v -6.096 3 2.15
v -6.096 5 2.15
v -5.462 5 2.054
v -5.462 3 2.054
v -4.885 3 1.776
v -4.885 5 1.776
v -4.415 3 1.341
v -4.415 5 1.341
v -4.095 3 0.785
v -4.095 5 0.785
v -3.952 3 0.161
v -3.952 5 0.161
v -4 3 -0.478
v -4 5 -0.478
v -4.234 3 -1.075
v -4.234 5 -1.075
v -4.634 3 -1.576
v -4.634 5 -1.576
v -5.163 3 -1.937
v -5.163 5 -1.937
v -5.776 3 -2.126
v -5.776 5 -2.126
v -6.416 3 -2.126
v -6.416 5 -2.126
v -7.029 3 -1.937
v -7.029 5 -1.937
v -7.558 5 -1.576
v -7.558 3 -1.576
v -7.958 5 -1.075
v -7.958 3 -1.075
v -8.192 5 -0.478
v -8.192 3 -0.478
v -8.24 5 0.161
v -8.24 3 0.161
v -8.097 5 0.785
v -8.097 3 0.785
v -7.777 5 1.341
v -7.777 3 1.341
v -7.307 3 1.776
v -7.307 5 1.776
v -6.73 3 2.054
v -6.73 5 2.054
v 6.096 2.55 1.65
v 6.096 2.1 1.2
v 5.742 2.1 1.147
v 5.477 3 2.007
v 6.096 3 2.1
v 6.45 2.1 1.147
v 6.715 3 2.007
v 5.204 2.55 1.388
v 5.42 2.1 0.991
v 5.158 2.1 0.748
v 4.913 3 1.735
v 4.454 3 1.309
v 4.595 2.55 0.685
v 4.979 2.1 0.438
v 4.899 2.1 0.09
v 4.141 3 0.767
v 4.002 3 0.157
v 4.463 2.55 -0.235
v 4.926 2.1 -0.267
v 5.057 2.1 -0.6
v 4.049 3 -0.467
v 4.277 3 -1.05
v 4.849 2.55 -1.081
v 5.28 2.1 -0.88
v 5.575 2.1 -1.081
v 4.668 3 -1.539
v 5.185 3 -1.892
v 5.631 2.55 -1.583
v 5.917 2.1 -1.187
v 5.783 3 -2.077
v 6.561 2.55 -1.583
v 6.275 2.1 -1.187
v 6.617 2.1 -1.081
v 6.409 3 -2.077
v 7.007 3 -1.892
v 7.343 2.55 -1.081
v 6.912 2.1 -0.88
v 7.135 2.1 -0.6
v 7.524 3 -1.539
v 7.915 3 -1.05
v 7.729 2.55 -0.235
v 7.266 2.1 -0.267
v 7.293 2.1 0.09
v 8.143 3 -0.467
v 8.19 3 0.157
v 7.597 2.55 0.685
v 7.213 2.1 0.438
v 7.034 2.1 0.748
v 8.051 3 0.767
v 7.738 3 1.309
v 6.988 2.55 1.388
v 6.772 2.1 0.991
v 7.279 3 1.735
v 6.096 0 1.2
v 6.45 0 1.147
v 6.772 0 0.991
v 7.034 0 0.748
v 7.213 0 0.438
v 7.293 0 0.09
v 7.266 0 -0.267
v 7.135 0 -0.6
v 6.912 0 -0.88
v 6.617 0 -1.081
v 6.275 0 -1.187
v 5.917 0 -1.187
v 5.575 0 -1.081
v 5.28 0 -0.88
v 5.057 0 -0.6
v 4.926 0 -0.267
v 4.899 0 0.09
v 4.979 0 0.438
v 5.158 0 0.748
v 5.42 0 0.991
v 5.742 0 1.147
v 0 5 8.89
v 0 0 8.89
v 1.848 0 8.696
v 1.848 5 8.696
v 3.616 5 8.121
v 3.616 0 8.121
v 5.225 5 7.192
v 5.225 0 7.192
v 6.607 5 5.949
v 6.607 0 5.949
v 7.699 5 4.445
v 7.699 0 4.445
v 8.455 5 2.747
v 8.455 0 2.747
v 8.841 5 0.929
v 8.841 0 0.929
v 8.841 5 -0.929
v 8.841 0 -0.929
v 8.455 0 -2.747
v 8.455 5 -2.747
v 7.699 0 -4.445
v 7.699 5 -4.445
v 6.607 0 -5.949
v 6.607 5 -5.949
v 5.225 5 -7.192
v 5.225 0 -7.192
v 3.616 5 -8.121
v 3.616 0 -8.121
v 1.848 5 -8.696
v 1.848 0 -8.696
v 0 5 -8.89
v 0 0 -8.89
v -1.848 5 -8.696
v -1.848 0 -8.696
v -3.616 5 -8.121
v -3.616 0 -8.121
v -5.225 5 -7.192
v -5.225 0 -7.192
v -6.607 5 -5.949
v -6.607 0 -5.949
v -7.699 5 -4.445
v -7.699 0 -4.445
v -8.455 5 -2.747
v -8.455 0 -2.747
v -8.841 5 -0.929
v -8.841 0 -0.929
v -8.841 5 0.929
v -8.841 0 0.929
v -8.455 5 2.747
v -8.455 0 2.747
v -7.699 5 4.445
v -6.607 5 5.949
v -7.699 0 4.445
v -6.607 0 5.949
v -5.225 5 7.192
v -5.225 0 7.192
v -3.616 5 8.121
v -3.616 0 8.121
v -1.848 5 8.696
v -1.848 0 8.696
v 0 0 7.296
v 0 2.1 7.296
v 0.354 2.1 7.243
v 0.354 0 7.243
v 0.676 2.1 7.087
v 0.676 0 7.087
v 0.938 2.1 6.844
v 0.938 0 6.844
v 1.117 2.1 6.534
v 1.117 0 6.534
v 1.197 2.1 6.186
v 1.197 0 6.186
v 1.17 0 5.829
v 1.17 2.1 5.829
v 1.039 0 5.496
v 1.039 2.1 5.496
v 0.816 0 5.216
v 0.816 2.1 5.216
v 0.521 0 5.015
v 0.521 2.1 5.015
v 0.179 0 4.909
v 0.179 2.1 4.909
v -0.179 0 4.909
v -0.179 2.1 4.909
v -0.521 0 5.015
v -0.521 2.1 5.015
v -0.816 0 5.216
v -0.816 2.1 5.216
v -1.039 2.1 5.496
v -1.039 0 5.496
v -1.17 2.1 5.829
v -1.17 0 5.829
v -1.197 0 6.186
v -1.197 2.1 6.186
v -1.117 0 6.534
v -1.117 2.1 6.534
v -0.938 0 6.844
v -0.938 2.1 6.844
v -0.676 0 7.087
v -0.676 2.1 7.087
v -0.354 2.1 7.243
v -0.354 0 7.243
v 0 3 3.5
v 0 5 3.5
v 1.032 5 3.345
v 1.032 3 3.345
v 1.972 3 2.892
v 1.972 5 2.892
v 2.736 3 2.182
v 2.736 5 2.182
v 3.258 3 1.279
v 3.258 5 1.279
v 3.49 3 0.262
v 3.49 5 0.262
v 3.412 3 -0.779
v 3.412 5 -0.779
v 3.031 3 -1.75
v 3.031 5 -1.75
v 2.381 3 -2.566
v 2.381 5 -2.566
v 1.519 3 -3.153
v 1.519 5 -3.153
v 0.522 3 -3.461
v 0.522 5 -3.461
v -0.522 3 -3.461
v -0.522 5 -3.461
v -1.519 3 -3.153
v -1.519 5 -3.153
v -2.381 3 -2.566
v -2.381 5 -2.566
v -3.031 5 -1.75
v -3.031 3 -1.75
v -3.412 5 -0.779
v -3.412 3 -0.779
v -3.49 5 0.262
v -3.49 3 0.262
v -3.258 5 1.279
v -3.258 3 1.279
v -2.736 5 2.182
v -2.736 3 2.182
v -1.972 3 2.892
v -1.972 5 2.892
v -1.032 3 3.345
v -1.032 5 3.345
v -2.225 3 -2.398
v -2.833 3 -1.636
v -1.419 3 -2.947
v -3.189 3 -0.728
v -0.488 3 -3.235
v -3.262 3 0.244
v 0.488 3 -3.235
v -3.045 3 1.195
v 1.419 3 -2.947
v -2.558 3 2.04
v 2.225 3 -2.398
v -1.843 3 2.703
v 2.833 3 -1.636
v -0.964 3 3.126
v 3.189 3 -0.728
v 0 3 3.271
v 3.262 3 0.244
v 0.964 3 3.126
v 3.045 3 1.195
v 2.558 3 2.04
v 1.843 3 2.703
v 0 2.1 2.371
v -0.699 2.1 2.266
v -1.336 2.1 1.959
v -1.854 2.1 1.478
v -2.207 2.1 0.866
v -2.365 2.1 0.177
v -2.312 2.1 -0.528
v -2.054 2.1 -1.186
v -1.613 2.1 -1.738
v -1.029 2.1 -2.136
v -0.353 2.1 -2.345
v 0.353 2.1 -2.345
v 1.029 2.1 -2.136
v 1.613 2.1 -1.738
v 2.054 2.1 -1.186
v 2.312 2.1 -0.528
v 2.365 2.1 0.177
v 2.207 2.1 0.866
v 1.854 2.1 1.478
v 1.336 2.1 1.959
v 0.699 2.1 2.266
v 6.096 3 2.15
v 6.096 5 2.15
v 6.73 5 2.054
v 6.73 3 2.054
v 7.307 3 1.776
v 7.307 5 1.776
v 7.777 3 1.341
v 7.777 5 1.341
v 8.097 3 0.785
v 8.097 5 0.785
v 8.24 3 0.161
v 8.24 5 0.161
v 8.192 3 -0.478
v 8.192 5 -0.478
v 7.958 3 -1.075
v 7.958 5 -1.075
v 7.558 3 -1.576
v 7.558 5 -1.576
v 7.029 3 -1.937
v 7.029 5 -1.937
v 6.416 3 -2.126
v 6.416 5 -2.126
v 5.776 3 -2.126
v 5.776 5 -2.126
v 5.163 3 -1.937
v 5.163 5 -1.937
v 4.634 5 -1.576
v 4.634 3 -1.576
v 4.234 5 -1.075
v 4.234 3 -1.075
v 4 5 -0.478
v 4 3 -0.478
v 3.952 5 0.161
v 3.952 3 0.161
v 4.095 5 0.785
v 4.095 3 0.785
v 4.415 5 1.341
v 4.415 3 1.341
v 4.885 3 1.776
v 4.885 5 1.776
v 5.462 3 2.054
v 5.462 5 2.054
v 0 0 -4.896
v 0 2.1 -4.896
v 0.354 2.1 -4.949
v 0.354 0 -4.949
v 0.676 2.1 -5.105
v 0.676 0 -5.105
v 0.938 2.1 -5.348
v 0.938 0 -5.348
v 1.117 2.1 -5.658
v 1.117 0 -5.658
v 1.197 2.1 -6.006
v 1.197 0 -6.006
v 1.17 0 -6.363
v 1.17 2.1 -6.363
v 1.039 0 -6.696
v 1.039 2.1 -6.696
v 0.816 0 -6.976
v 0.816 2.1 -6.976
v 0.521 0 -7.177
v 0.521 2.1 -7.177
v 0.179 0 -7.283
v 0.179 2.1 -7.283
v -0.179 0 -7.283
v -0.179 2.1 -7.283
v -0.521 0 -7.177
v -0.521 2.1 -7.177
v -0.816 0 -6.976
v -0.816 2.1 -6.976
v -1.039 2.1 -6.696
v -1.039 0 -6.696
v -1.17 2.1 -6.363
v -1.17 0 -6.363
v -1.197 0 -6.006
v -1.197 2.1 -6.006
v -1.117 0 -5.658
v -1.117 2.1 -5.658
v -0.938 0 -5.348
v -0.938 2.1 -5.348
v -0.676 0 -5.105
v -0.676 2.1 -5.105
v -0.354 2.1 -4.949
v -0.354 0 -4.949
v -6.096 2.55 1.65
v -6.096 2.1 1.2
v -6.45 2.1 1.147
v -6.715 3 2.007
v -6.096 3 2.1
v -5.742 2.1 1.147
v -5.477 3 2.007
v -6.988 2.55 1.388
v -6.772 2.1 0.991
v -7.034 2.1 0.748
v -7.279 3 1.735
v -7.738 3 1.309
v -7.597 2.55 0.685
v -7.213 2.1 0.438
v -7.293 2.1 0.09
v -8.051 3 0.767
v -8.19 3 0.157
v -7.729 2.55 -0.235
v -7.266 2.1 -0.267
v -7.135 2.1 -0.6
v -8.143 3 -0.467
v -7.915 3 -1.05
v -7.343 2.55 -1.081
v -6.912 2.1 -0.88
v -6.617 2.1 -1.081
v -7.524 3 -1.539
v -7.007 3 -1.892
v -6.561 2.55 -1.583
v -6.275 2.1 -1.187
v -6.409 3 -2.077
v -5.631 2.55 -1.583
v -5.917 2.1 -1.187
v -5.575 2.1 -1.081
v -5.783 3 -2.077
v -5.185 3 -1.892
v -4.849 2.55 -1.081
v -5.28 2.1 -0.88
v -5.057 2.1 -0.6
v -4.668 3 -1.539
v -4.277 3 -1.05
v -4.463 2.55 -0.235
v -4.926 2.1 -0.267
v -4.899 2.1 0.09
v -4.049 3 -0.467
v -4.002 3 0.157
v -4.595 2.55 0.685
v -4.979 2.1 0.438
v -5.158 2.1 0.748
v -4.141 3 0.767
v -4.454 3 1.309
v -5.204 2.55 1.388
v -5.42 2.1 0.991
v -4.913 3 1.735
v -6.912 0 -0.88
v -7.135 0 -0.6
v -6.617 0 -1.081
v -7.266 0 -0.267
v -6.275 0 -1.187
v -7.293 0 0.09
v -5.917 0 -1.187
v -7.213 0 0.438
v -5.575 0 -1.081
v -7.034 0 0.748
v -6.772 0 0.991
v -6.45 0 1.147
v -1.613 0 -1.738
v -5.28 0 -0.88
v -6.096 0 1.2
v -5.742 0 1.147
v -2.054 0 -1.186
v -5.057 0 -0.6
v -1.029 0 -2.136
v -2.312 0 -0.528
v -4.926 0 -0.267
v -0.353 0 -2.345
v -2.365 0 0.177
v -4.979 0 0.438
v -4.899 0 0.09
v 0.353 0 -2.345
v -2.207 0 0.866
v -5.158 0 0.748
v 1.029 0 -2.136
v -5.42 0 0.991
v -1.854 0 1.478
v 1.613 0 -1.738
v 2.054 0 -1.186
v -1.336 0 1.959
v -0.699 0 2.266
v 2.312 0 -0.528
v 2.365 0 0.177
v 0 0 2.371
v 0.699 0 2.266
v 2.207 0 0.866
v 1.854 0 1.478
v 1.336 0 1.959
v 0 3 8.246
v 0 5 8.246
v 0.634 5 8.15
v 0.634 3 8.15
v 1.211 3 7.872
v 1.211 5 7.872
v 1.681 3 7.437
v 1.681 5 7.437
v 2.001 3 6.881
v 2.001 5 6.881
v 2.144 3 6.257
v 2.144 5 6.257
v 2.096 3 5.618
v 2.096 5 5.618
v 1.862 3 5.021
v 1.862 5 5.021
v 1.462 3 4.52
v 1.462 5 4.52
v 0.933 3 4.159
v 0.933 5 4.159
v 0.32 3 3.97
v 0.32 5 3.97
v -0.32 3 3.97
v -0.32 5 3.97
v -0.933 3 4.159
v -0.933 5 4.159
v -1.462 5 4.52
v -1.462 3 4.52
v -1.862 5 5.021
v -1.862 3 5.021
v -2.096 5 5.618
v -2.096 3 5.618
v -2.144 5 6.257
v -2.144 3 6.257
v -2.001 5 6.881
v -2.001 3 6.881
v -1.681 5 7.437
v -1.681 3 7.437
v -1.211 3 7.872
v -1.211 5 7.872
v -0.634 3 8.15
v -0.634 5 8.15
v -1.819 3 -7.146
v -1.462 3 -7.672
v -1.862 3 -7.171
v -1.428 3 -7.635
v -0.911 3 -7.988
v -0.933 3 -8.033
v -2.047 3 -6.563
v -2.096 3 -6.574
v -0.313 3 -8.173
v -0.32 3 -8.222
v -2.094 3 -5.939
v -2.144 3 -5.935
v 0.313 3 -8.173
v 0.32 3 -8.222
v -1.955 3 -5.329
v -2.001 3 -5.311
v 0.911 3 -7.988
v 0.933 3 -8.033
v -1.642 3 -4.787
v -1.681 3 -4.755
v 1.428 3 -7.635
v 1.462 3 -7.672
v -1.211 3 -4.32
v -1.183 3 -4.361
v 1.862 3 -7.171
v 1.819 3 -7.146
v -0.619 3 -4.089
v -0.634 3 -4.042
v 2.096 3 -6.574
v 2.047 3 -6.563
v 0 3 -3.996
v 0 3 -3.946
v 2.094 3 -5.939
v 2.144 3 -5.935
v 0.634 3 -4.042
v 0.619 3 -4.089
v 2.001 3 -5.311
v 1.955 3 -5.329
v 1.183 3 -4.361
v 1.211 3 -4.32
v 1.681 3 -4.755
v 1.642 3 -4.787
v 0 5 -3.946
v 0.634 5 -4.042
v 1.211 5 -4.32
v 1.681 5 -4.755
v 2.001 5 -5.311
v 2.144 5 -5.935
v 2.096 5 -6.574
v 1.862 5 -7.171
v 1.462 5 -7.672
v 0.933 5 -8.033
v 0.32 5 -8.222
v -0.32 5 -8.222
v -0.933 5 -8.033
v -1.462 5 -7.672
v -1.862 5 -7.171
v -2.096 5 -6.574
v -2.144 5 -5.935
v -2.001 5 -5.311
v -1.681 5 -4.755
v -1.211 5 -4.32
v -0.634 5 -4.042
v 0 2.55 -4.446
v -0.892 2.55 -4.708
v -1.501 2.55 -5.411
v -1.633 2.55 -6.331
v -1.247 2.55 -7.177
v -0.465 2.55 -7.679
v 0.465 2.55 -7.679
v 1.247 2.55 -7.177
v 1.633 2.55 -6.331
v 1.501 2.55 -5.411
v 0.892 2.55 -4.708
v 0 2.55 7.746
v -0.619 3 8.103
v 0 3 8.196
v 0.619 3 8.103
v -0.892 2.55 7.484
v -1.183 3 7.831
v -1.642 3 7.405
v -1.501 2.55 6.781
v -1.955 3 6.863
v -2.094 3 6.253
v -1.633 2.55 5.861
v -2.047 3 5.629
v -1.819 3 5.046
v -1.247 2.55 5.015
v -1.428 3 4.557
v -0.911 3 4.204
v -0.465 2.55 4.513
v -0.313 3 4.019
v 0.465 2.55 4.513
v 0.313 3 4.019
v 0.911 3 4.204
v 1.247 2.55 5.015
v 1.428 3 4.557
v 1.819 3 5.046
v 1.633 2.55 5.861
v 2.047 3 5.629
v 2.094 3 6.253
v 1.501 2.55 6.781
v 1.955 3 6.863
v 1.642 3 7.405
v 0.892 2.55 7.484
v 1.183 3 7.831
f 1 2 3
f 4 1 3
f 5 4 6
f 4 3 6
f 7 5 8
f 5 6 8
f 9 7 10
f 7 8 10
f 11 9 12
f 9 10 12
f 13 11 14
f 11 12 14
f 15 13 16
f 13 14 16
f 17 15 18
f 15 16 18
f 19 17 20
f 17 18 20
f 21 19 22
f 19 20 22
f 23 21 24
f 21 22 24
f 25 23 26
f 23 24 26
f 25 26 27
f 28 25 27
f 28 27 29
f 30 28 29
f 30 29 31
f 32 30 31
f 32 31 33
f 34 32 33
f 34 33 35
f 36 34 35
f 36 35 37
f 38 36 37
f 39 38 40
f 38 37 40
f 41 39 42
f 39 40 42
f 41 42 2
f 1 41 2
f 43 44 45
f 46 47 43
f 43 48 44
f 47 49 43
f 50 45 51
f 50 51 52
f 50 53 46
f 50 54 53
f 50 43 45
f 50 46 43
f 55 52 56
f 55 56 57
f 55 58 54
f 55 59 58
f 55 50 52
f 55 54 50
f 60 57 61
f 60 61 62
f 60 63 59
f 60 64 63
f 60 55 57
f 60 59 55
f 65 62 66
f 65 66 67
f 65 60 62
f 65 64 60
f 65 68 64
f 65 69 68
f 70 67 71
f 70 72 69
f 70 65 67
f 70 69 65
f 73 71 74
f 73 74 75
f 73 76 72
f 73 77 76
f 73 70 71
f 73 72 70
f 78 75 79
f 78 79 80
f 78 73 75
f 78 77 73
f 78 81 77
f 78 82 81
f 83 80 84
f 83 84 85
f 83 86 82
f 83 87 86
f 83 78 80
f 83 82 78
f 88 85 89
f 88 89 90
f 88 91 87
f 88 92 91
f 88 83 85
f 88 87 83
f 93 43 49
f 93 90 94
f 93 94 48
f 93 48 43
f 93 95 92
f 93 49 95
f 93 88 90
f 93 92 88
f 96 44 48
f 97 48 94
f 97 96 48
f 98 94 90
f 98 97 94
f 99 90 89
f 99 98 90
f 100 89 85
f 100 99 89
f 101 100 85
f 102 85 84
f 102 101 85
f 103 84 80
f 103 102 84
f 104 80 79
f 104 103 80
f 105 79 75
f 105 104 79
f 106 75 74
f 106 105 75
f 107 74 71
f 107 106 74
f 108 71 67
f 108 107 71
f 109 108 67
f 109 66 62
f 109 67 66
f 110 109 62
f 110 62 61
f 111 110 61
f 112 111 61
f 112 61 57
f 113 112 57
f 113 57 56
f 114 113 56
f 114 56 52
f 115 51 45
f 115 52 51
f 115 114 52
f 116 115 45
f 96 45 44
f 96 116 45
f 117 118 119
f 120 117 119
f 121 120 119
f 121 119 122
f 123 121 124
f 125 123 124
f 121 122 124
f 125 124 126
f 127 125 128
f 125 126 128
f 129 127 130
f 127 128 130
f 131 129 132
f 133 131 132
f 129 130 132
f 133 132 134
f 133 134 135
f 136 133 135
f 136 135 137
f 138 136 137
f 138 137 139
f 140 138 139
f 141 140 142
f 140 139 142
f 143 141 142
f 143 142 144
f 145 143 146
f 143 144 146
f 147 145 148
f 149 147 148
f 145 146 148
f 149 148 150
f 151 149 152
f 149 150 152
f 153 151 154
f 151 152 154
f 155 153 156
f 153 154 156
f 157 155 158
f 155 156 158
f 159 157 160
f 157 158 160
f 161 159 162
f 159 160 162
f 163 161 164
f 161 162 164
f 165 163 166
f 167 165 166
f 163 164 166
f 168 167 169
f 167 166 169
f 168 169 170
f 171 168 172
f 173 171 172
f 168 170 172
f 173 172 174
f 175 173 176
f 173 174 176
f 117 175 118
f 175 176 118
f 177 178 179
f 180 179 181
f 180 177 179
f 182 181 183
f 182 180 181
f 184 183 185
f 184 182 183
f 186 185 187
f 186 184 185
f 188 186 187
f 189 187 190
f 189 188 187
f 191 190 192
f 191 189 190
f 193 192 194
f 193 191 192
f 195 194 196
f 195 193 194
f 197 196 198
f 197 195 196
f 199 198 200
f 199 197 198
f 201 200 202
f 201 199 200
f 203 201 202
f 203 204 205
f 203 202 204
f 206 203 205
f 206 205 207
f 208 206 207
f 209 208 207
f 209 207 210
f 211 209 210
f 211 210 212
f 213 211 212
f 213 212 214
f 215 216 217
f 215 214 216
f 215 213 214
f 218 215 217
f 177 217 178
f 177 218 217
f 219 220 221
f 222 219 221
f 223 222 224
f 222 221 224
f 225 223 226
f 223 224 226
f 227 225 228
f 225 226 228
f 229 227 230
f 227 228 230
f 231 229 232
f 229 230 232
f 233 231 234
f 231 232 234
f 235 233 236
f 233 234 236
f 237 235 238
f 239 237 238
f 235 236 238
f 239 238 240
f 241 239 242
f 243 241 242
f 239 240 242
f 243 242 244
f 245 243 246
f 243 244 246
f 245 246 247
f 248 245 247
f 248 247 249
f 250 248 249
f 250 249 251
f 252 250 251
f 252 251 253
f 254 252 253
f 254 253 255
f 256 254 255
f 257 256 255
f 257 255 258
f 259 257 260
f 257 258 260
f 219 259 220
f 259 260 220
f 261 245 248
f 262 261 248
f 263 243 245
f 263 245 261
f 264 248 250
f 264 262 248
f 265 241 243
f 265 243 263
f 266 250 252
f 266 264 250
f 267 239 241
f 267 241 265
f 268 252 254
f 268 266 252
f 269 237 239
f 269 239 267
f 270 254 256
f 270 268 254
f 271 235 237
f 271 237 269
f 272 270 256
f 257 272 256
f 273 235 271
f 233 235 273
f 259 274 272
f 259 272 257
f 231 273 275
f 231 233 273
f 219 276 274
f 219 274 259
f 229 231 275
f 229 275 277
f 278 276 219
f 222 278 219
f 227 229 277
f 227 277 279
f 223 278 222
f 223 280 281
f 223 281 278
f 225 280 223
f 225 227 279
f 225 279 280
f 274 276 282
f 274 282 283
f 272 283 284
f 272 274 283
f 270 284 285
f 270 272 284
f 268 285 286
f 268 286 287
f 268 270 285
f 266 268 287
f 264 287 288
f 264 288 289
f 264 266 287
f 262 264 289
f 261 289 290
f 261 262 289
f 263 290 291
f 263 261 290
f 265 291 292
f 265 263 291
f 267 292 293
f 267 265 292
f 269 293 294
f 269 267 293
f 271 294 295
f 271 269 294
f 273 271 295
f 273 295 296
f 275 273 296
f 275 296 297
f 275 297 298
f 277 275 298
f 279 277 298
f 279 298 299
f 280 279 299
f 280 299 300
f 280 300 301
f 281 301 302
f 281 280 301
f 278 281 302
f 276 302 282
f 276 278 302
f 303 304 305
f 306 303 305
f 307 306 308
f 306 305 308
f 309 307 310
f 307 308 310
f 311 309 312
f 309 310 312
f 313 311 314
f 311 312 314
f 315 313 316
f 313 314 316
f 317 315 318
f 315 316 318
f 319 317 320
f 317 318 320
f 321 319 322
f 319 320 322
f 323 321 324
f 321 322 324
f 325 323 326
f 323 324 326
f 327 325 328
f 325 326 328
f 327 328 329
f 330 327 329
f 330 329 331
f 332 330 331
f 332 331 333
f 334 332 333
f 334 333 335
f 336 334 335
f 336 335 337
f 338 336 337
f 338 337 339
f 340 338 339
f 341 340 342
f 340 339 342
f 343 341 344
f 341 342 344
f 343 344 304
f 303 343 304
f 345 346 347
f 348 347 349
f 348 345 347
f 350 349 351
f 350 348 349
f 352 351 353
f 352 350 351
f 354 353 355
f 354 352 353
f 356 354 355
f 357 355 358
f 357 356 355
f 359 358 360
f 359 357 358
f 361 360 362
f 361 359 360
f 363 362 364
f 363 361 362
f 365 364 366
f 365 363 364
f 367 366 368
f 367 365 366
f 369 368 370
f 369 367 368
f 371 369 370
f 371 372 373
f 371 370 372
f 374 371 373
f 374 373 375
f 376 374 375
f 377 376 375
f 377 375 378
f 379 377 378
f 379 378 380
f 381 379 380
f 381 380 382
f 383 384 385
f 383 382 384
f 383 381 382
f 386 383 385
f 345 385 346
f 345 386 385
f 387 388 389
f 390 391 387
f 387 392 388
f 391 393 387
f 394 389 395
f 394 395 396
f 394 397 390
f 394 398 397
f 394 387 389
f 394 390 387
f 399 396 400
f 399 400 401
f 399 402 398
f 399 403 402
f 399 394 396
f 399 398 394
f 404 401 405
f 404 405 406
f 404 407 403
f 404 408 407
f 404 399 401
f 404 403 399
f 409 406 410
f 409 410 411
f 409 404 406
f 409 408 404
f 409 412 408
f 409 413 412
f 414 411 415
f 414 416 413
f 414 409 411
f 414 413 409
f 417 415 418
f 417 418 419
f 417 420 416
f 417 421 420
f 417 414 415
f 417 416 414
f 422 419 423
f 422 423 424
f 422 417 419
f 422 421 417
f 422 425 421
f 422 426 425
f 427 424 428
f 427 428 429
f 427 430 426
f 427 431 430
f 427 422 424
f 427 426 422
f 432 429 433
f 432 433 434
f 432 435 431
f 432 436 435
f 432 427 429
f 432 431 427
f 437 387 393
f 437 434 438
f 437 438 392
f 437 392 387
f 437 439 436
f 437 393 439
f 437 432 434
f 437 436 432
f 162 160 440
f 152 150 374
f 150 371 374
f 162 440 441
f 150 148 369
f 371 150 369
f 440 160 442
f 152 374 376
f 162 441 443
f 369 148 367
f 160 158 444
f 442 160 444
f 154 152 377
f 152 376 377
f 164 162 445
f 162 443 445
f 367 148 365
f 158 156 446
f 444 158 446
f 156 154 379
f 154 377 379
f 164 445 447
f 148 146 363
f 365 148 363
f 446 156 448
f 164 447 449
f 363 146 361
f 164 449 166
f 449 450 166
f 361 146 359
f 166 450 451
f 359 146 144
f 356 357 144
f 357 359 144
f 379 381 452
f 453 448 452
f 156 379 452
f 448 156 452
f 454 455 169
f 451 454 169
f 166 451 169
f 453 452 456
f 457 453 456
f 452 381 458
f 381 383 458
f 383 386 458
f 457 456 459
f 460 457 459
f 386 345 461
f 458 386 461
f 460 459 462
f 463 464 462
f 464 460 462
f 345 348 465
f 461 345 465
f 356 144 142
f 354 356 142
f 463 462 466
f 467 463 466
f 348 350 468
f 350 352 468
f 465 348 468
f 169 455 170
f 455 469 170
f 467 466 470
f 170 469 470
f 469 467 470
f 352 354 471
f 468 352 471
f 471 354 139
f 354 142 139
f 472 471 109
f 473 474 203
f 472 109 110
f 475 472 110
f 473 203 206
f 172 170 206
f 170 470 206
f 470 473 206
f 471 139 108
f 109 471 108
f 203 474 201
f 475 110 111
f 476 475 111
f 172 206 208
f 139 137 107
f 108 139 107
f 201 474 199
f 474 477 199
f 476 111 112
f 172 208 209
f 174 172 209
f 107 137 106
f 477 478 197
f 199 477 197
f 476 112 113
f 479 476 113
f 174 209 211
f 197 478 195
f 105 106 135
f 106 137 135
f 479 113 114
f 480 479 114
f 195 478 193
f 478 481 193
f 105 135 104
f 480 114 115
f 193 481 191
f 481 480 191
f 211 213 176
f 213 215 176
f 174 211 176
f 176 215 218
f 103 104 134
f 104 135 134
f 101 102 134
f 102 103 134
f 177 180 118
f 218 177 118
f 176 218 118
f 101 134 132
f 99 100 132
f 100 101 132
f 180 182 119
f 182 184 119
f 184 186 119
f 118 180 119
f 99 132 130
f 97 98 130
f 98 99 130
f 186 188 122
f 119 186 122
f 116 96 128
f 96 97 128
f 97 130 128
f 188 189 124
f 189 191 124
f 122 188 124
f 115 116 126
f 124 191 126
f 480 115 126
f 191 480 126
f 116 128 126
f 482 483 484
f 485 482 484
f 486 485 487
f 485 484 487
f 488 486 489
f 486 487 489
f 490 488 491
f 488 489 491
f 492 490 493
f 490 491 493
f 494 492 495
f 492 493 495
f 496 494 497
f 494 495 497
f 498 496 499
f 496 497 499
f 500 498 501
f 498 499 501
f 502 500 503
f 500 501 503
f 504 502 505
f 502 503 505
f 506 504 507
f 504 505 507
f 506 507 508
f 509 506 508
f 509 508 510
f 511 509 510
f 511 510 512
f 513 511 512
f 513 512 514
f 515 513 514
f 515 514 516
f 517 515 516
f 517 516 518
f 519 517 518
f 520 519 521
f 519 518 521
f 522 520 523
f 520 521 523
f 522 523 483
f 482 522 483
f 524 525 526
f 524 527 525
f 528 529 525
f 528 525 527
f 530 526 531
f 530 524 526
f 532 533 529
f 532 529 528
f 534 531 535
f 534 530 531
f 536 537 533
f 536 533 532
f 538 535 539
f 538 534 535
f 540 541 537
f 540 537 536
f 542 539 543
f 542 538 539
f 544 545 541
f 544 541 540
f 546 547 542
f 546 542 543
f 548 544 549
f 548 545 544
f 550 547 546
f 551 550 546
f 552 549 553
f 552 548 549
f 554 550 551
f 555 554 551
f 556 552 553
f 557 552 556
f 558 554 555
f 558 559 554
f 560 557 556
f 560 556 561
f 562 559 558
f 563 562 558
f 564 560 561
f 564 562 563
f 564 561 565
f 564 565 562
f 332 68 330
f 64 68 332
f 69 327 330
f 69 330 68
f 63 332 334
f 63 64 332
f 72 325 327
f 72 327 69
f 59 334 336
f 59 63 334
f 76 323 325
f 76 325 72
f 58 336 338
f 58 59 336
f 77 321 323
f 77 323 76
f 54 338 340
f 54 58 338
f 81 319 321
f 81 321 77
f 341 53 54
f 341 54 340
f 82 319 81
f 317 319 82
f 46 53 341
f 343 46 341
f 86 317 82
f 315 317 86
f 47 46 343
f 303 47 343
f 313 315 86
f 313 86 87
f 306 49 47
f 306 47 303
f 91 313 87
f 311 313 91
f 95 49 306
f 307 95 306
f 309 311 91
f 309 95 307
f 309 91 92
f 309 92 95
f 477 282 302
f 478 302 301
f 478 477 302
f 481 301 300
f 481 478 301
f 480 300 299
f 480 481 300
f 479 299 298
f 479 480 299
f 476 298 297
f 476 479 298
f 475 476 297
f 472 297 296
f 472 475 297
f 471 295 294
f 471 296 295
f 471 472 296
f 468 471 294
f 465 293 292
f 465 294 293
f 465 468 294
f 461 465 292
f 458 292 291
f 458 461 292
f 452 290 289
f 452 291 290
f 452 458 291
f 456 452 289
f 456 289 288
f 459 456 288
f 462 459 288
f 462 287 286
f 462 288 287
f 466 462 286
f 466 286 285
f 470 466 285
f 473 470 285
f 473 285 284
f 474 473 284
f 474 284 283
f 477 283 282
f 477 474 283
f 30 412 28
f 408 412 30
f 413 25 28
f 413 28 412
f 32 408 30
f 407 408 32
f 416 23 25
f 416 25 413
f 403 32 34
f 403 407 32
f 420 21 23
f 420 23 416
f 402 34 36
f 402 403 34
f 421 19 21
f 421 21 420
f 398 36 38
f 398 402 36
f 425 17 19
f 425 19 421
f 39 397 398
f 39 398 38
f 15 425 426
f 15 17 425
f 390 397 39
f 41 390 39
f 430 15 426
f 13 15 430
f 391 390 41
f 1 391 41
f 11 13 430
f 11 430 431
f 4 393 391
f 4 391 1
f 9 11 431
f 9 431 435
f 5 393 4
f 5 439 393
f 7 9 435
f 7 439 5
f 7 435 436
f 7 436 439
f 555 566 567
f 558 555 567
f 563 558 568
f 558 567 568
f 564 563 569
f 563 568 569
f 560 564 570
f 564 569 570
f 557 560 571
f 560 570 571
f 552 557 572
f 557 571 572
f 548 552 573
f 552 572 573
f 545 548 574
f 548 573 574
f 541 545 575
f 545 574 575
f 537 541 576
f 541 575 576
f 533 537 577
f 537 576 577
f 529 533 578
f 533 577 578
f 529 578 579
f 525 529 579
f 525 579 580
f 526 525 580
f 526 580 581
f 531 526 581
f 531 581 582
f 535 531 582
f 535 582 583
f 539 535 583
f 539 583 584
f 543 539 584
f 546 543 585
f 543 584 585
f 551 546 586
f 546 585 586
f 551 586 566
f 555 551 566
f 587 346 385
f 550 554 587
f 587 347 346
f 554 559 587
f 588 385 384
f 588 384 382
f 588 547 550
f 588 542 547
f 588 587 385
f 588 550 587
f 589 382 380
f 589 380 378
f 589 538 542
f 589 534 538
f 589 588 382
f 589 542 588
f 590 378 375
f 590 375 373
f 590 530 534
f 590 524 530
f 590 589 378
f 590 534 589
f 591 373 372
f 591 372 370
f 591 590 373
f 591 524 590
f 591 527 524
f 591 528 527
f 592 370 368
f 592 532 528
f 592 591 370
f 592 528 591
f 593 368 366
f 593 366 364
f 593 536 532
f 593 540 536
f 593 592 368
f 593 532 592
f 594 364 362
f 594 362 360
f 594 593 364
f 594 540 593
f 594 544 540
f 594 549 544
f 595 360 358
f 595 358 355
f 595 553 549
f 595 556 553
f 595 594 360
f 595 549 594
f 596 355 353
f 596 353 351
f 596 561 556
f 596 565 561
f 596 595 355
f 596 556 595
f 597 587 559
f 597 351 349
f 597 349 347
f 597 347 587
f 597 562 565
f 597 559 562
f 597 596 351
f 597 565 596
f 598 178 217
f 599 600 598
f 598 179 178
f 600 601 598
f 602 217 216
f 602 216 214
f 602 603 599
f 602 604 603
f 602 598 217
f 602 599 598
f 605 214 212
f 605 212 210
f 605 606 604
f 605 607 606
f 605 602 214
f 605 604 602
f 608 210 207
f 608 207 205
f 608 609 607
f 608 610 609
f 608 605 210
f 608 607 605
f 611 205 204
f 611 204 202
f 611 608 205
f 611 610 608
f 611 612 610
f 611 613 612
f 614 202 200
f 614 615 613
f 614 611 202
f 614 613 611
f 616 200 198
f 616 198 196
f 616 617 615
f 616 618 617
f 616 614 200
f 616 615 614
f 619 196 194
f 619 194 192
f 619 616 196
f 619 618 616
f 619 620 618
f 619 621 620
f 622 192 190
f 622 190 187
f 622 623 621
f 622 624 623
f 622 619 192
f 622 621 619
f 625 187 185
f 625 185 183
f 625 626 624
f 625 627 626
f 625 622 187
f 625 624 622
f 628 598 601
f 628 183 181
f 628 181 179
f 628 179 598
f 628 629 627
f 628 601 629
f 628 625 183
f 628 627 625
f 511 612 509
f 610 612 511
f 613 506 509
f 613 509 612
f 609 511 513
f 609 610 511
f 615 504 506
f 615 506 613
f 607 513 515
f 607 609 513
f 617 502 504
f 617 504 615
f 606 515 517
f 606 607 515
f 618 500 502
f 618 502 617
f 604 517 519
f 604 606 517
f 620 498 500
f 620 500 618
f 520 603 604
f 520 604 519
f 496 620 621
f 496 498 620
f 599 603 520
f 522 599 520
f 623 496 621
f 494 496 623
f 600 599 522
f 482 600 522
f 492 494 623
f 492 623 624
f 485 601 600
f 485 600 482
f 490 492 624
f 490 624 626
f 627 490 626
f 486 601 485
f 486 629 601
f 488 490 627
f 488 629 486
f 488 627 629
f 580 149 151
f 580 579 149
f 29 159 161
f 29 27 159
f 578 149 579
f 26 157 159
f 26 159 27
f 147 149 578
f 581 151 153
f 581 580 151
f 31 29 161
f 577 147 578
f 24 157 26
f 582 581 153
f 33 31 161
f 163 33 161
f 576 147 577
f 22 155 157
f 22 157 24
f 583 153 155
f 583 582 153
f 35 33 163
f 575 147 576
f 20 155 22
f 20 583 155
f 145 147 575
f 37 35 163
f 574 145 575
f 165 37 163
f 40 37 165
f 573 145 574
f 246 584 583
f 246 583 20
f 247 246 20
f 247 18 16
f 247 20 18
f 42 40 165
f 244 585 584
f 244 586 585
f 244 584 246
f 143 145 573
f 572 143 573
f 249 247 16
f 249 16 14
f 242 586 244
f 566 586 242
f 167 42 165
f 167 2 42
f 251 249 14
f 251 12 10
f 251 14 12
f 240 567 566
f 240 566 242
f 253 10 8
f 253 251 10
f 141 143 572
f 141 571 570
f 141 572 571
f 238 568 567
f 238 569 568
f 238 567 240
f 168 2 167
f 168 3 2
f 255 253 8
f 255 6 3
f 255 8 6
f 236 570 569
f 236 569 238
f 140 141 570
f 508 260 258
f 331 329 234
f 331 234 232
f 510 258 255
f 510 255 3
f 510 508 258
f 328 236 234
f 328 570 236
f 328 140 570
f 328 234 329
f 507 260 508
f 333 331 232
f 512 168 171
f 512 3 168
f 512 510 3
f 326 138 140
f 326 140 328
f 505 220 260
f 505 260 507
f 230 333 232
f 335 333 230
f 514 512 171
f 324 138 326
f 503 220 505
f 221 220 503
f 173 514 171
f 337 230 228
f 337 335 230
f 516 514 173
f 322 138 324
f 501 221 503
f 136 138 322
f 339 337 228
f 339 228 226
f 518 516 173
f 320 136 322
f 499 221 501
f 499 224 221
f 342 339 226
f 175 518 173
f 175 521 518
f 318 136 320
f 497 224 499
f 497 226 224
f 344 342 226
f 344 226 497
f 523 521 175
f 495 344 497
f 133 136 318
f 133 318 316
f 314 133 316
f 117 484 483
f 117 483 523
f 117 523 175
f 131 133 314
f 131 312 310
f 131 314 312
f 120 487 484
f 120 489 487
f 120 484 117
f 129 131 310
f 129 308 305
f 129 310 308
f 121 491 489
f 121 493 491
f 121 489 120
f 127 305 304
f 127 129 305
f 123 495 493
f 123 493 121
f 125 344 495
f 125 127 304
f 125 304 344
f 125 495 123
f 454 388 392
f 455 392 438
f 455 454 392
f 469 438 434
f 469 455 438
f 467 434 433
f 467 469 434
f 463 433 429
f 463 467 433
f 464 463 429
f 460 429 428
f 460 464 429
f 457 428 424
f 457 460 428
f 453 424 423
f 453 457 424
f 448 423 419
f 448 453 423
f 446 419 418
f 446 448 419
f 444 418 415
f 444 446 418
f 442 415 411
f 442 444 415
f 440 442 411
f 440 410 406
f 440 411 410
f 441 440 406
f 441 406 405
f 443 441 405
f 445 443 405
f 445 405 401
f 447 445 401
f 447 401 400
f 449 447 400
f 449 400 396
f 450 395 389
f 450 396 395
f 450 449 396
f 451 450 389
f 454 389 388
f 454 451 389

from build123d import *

# Parameters (mm, degrees)
SKETCH1_R           = 8.89
SKETCH1_R_2         = 1.2
SKETCH1_R_3         = 2.37125
BOSS_EXTRUDE1_DEPTH = 5
SKETCH2_R           = 2.15
SKETCH2_R_2         = 3.5
CUT_EXTRUDE1_DEPTH  = 2
CHAMFER1_SIZE       = 0.9


with BuildPart() as part:
    # Sketch1 → Boss-Extrude1 (new body)
    with BuildSketch(Plane(origin=(0, 0, 0), x_dir=(1, 0, 0), z_dir=(0, 1, 0))):
        Circle(SKETCH1_R)
        with Locations((0, -6.096)):
            Circle(SKETCH1_R_2, mode=Mode.SUBTRACT)
        with Locations((-6.096, 0)):
            Circle(SKETCH1_R_2, mode=Mode.SUBTRACT)
        Circle(SKETCH1_R_3, mode=Mode.SUBTRACT)
        with Locations((6.096, 0)):
            Circle(SKETCH1_R_2, mode=Mode.SUBTRACT)
        with Locations((0, 6.096)):
            Circle(SKETCH1_R_2, mode=Mode.SUBTRACT)
    extrude(amount=BOSS_EXTRUDE1_DEPTH)

    # Sketch2 → Cut-Extrude1 (cut)
    with BuildSketch(Plane(origin=(0, 5, 0), x_dir=(1, 0, 0), z_dir=(0, 1, 0))):
        with Locations((0, 6.096)):
            Circle(SKETCH2_R)
        with Locations((-6.096, 0)):
            Circle(SKETCH2_R)
        with Locations((6.096, 0)):
            Circle(SKETCH2_R)
        with Locations((0, -6.096)):
            Circle(SKETCH2_R)
        Circle(SKETCH2_R_2)
    extrude(amount=-CUT_EXTRUDE1_DEPTH, mode=Mode.SUBTRACT)

    # Chamfer1
    chamfer1_edges = [part.edges().sort_by_distance(p)[0] for p in [
        (-1.2, 3, 6.096),
        (4.896, 3, 0),
        (-2.37125, 3, 0),
        (-7.296, 3, 0),
        (-1.2, 3, -6.096),
    ]]
    chamfer(chamfer1_edges, length=CHAMFER1_SIZE)


solid = part.part
